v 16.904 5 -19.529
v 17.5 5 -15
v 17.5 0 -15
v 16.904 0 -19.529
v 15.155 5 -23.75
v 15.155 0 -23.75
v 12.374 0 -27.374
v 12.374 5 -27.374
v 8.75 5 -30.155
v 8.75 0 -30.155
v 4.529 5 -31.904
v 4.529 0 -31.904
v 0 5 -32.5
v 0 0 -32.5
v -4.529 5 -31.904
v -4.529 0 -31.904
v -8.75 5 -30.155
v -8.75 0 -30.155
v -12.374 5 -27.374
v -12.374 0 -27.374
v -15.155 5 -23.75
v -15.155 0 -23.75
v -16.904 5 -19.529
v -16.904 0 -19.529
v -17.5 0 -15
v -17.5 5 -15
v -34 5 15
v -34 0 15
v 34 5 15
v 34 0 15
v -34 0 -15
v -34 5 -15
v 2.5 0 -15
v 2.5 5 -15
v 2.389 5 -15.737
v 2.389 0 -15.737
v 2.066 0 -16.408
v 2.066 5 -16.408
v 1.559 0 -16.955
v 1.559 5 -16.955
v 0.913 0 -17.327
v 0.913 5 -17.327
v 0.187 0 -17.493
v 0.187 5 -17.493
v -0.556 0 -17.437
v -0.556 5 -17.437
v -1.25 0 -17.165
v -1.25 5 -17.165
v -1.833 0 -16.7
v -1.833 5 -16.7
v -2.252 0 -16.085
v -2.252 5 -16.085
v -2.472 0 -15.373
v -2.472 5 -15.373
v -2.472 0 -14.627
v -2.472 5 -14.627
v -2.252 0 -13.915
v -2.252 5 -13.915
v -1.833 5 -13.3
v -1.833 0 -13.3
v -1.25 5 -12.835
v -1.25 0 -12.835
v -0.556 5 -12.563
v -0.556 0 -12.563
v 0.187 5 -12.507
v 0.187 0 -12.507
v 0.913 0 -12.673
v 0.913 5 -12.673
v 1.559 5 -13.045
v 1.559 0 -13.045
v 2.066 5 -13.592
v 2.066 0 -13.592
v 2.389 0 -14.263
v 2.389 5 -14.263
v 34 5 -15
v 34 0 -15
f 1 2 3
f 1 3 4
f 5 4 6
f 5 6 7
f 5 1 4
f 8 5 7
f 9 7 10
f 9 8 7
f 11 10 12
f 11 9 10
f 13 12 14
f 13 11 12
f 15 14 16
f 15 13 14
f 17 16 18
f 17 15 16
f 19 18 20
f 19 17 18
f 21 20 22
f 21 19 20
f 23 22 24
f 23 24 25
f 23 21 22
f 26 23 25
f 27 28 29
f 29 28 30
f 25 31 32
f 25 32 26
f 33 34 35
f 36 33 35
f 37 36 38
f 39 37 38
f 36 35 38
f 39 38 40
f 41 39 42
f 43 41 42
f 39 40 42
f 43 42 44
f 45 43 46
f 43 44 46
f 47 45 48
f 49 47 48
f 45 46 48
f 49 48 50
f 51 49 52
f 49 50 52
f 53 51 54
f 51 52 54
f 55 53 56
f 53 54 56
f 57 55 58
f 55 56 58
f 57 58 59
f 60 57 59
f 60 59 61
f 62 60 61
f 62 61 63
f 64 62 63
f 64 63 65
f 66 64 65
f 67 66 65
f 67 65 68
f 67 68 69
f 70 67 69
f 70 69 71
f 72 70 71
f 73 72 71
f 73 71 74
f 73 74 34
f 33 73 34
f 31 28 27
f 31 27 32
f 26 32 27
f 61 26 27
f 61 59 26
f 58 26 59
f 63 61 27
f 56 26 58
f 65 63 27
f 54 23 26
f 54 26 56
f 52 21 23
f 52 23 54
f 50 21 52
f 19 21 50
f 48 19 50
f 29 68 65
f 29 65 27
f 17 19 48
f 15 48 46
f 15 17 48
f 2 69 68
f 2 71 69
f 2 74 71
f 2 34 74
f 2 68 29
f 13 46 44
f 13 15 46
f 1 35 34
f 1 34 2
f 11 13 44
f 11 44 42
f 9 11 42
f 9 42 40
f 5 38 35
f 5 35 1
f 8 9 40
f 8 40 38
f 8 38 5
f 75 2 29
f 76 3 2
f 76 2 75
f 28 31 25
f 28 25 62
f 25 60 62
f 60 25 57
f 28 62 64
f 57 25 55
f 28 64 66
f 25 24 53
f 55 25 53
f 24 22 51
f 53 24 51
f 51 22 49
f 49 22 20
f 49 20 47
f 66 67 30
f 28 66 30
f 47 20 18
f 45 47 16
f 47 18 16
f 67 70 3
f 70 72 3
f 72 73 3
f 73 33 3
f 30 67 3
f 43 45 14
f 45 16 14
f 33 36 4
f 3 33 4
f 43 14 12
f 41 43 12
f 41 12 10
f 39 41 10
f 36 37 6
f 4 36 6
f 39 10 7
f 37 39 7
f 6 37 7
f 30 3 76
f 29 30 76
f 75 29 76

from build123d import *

# Parameters (mm, degrees)
SKETCH1_W               = 68
SKETCH1_H               = 30
BOSS_EXTRUDE1_DEPTH     = 5
SKETCH2_R               = 17.5
BOSS_EXTRUDE2_DEPTH     = 5
SKETCH3_R               = 2.5
CUT_EXTRUDE1_DEPTH      = 1
CUT_EXTRUDE1_DEPTH_BACK = 6


with BuildPart() as part:
    # Sketch1 → Boss-Extrude1 (new body)
    with BuildSketch(Plane(origin=(0, 0, 0), x_dir=(1, 0, 0), z_dir=(0, 1, 0))):
        Rectangle(SKETCH1_W, SKETCH1_H)
    extrude(amount=BOSS_EXTRUDE1_DEPTH)

    # Sketch2 → Boss-Extrude2 (add)
    with BuildSketch(Plane(origin=(0, 5, 0), x_dir=(1, 0, 0), z_dir=(0, 1, 0))):
        with Locations((0, 15)):
            Circle(SKETCH2_R)
    extrude(amount=-BOSS_EXTRUDE2_DEPTH)

    # Sketch3 → Cut-Extrude1 (cut, two sides)
    with BuildSketch(Plane(origin=(0, 5, 0), x_dir=(1, 0, 0), z_dir=(0, 1, 0))) as cut_extrude1_sk:
        with Locations((0, 15)):
            Circle(SKETCH3_R)
    extrude(amount=CUT_EXTRUDE1_DEPTH, mode=Mode.SUBTRACT)
    extrude(cut_extrude1_sk.sketch, amount=-CUT_EXTRUDE1_DEPTH_BACK, mode=Mode.SUBTRACT)


solid = part.part
